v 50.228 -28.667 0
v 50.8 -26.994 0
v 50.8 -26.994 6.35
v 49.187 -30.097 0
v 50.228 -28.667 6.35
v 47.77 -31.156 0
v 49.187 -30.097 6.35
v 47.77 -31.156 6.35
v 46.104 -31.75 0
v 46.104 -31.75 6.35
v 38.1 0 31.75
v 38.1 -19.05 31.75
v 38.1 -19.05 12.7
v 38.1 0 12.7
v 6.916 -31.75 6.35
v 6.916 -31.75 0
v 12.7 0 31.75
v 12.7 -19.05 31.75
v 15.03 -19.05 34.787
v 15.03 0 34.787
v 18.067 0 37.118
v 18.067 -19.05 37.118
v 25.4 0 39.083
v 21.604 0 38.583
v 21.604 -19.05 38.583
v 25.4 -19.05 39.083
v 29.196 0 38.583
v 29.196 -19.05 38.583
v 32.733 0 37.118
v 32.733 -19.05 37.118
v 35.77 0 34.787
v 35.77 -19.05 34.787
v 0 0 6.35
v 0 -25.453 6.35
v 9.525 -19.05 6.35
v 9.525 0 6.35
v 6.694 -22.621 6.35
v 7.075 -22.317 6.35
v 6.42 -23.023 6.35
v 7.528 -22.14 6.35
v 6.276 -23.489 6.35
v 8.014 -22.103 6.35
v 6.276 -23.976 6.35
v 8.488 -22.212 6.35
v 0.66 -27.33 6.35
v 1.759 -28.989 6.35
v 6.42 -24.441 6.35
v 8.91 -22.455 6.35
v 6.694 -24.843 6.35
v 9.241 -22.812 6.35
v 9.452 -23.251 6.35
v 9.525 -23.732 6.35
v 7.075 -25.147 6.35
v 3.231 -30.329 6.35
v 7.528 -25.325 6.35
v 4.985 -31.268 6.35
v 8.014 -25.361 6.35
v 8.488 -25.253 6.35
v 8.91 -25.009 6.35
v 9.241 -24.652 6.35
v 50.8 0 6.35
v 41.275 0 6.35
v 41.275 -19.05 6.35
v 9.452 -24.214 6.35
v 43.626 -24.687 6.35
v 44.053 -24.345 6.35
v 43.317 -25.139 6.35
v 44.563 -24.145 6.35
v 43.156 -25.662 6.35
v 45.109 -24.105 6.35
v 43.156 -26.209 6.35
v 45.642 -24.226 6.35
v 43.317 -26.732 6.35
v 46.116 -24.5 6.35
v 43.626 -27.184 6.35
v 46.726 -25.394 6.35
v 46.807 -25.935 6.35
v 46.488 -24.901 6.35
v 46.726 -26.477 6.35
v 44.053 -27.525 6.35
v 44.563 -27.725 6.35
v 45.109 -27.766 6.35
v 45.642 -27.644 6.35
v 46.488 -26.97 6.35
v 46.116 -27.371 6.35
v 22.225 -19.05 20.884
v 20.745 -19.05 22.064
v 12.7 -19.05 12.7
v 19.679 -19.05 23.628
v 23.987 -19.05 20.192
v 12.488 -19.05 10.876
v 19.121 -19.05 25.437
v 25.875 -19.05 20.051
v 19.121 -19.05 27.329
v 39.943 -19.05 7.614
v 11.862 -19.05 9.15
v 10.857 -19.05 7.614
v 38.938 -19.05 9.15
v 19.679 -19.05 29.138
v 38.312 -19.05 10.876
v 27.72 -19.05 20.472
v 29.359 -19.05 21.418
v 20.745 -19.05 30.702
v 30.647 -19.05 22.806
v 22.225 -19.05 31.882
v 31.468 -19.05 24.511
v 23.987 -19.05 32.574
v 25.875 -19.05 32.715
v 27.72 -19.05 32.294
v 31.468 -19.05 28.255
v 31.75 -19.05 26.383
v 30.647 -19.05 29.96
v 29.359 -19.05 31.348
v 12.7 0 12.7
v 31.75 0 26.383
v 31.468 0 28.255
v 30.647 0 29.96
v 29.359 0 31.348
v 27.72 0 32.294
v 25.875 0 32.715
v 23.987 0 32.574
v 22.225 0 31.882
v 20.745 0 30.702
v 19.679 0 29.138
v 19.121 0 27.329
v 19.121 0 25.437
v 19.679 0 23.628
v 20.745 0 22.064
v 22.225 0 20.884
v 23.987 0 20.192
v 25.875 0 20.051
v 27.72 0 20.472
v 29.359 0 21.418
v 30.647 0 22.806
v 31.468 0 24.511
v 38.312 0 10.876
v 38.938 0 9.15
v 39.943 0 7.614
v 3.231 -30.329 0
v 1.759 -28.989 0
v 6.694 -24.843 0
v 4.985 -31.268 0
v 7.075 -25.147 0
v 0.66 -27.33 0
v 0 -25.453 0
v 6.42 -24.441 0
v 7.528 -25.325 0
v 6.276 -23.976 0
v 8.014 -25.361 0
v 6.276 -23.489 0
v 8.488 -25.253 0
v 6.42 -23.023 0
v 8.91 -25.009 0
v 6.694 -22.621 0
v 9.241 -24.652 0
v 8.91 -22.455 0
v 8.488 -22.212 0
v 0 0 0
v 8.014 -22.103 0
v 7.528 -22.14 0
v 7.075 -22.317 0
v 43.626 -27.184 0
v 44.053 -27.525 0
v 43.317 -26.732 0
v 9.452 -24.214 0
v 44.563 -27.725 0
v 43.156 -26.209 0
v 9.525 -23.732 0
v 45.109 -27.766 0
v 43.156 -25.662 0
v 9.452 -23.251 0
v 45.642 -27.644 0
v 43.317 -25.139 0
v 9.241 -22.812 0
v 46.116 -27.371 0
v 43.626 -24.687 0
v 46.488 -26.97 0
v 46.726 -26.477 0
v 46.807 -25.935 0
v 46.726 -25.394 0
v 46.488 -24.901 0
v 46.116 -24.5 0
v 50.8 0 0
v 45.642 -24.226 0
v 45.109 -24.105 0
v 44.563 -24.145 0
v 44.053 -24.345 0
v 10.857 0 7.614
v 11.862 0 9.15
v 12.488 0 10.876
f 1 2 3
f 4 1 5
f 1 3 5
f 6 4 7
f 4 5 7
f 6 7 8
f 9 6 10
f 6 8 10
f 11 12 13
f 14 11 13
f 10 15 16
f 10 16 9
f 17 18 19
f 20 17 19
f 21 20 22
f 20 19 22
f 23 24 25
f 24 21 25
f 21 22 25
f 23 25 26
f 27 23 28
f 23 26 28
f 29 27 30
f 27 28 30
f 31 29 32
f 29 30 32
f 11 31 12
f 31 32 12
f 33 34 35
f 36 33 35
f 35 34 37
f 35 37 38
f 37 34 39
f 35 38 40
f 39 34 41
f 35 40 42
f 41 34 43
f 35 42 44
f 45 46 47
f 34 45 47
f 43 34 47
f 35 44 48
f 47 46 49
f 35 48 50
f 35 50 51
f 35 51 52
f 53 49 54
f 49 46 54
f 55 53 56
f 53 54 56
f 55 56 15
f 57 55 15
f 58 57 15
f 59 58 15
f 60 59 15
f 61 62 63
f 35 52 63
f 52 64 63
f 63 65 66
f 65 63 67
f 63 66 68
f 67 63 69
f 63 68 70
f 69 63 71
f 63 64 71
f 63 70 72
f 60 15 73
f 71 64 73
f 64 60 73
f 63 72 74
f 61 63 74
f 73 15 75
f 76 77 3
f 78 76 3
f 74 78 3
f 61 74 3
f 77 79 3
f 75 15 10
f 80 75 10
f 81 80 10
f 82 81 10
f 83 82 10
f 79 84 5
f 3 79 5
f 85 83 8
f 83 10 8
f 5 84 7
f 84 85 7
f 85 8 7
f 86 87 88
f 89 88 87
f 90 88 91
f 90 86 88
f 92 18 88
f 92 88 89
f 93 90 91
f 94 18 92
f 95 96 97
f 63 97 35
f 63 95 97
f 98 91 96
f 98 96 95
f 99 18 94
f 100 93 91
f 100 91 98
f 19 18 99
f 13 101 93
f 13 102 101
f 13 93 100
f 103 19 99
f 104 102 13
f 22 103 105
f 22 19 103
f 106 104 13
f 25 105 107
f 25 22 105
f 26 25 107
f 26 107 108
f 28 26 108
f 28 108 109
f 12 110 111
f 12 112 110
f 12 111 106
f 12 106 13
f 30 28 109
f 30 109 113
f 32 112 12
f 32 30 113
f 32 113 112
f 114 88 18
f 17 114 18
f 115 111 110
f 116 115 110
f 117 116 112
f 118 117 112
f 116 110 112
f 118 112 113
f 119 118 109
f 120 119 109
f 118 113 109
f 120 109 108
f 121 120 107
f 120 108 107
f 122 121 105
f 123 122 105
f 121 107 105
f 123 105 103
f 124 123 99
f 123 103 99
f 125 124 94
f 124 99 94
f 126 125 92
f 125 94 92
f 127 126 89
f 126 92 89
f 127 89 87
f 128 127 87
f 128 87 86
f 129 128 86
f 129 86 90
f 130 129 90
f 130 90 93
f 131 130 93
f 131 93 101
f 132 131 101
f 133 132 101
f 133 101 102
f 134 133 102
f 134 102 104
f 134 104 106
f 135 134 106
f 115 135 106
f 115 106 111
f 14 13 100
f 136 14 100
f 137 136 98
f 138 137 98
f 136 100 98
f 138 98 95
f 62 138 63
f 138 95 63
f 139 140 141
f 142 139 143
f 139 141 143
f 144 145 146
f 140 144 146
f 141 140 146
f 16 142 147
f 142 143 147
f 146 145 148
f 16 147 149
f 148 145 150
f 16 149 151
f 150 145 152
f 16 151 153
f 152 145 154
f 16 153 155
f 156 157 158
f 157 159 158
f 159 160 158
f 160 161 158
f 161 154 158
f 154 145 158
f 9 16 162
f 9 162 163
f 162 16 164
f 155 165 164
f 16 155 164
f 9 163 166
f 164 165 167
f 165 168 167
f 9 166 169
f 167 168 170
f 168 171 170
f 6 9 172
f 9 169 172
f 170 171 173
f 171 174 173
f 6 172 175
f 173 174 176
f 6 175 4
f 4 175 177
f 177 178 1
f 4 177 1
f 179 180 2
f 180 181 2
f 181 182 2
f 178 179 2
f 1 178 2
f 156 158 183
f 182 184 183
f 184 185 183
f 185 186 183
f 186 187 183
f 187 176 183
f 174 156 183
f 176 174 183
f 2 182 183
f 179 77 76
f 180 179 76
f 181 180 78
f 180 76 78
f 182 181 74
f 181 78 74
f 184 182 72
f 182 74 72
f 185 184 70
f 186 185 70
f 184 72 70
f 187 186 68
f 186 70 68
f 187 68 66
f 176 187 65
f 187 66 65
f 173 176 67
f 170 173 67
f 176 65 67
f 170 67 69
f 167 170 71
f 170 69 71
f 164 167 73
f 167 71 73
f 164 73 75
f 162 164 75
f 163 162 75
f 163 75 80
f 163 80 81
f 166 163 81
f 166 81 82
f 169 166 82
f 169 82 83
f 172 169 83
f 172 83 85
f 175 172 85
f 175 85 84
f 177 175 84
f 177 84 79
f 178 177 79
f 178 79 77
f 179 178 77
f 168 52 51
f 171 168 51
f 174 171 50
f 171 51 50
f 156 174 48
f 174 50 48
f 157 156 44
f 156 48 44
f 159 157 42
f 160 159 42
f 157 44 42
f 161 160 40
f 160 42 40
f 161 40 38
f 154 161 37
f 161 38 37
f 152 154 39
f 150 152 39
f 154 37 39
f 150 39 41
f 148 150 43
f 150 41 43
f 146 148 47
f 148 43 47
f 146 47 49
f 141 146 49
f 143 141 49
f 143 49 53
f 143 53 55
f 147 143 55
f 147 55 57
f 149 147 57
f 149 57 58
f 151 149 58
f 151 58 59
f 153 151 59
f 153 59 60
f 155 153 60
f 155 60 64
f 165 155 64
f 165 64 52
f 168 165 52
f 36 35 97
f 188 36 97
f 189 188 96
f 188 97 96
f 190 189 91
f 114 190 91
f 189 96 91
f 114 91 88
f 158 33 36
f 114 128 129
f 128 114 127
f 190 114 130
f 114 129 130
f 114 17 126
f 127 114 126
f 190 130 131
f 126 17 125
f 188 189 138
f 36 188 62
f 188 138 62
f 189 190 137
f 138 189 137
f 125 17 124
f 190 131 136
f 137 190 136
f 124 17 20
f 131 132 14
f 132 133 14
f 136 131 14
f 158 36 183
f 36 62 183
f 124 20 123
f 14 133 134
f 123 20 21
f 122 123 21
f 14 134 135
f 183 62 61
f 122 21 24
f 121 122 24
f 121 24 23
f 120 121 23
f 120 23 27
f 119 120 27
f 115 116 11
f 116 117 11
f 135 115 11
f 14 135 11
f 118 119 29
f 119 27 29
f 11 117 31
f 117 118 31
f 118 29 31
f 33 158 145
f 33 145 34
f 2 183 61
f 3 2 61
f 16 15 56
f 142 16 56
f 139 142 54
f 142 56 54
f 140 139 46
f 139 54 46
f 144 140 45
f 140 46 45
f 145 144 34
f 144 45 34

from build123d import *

# Parameters (mm, degrees)
F0_W      = 50.8
F0_H      = 44.45
F1_DEPTH  = 31.75
F2_W      = 50.8
F2_H      = 12.7
F3_DEPTH  = 38.1
F5_DEPTH  = 25.4
F7_DEPTH  = 25.4
F8_R      = 6.35
F9_DEPTH  = 25.4
F11_DEPTH = 25.4
F12_R     = 1.8359706644
F12_R_2   = 1.6334944076
F13_DEPTH = 25.4


with BuildPart() as f1:
    # F0 (on Front) → F1 (new body)
    with BuildSketch(Plane.XZ):
        with Locations((25.4, 22.225)):
            Rectangle(F0_W, F0_H)
    extrude(amount=F1_DEPTH)

    # F2 (on face) → F3 (cut)
    with BuildSketch(Plane.XY.offset(44.45)):
        with Locations((25.4, -25.4)):
            Rectangle(F2_W, F2_H)
    extrude(amount=-F3_DEPTH, mode=Mode.SUBTRACT)

    # F4 (on face) → F5 (cut)
    with BuildSketch(Plane.XZ.offset(19.05)):
        with BuildLine():
            Line((12.7, 12.7), (12.7, 44.45))
            Line((12.7, 44.45), (0, 44.45))
            Line((0, 44.45), (0, 6.35))
            Line((0, 6.35), (9.525, 6.35))
            ThreePointArc((9.525, 6.35), (11.8620158286, 9.1502420857), (12.7, 12.7))
        make_face()
        with BuildLine():
            Line((50.8, 44.45), (38.1, 44.45))
            Line((38.1, 44.45), (38.1, 12.7))
            ThreePointArc((38.1, 12.7), (38.9379841714, 9.1502420857), (41.275, 6.35))
            Line((41.275, 6.35), (50.8, 6.35))
            Line((50.8, 6.35), (50.8, 44.45))
        make_face()
    extrude(amount=-F5_DEPTH, mode=Mode.SUBTRACT)

    # F6 (on face) → F7 (cut)
    with BuildSketch(Plane.XZ.offset(19.05)):
        with BuildLine():
            ThreePointArc((12.7, 31.75), (25.4, 39.0829550295), (38.1, 31.75))
            Line((38.1, 31.75), (38.1, 44.45))
            Line((38.1, 44.45), (12.7, 44.45))
            Line((12.7, 44.45), (12.7, 31.75))
        make_face()
    extrude(amount=-F7_DEPTH, mode=Mode.SUBTRACT)

    # F8 (on face) → F9 (cut)
    with BuildSketch(Plane.XZ.offset(19.05)):
        with Locations((25.4, 26.3829550295)):
            Circle(F8_R)
    extrude(amount=-F9_DEPTH, mode=Mode.SUBTRACT)

    # F10 (on face) → F11 (cut)
    with BuildSketch(Plane.XY.offset(6.35)):
        with BuildLine():
            ThreePointArc((6.9156312384, -31.75), (2.4537189806, -29.7044848728), (0, -25.4533607513))
            Line((0, -25.4533607513), (0, -31.75))
            Line((0, -31.75), (6.9156312384, -31.75))
        make_face()
        with BuildLine():
            ThreePointArc((50.8, -26.9937257878), (49.186939224, -30.097358798), (46.1042001843, -31.75))
            Line((46.1042001843, -31.75), (50.8, -31.75))
            Line((50.8, -31.75), (50.8, -26.9937257878))
        make_face()
    extrude(amount=-F11_DEPTH, mode=Mode.SUBTRACT)

    # F12 (on face) → F13 (cut)
    with BuildSketch(Plane.XY.offset(6.35)):
        with Locations((44.9713739546, -25.9353929963)):
            Circle(F12_R)
        with Locations((7.8915055924, -23.7321358982)):
            Circle(F12_R_2)
    extrude(amount=-F13_DEPTH, mode=Mode.SUBTRACT)


solid = f1.part
